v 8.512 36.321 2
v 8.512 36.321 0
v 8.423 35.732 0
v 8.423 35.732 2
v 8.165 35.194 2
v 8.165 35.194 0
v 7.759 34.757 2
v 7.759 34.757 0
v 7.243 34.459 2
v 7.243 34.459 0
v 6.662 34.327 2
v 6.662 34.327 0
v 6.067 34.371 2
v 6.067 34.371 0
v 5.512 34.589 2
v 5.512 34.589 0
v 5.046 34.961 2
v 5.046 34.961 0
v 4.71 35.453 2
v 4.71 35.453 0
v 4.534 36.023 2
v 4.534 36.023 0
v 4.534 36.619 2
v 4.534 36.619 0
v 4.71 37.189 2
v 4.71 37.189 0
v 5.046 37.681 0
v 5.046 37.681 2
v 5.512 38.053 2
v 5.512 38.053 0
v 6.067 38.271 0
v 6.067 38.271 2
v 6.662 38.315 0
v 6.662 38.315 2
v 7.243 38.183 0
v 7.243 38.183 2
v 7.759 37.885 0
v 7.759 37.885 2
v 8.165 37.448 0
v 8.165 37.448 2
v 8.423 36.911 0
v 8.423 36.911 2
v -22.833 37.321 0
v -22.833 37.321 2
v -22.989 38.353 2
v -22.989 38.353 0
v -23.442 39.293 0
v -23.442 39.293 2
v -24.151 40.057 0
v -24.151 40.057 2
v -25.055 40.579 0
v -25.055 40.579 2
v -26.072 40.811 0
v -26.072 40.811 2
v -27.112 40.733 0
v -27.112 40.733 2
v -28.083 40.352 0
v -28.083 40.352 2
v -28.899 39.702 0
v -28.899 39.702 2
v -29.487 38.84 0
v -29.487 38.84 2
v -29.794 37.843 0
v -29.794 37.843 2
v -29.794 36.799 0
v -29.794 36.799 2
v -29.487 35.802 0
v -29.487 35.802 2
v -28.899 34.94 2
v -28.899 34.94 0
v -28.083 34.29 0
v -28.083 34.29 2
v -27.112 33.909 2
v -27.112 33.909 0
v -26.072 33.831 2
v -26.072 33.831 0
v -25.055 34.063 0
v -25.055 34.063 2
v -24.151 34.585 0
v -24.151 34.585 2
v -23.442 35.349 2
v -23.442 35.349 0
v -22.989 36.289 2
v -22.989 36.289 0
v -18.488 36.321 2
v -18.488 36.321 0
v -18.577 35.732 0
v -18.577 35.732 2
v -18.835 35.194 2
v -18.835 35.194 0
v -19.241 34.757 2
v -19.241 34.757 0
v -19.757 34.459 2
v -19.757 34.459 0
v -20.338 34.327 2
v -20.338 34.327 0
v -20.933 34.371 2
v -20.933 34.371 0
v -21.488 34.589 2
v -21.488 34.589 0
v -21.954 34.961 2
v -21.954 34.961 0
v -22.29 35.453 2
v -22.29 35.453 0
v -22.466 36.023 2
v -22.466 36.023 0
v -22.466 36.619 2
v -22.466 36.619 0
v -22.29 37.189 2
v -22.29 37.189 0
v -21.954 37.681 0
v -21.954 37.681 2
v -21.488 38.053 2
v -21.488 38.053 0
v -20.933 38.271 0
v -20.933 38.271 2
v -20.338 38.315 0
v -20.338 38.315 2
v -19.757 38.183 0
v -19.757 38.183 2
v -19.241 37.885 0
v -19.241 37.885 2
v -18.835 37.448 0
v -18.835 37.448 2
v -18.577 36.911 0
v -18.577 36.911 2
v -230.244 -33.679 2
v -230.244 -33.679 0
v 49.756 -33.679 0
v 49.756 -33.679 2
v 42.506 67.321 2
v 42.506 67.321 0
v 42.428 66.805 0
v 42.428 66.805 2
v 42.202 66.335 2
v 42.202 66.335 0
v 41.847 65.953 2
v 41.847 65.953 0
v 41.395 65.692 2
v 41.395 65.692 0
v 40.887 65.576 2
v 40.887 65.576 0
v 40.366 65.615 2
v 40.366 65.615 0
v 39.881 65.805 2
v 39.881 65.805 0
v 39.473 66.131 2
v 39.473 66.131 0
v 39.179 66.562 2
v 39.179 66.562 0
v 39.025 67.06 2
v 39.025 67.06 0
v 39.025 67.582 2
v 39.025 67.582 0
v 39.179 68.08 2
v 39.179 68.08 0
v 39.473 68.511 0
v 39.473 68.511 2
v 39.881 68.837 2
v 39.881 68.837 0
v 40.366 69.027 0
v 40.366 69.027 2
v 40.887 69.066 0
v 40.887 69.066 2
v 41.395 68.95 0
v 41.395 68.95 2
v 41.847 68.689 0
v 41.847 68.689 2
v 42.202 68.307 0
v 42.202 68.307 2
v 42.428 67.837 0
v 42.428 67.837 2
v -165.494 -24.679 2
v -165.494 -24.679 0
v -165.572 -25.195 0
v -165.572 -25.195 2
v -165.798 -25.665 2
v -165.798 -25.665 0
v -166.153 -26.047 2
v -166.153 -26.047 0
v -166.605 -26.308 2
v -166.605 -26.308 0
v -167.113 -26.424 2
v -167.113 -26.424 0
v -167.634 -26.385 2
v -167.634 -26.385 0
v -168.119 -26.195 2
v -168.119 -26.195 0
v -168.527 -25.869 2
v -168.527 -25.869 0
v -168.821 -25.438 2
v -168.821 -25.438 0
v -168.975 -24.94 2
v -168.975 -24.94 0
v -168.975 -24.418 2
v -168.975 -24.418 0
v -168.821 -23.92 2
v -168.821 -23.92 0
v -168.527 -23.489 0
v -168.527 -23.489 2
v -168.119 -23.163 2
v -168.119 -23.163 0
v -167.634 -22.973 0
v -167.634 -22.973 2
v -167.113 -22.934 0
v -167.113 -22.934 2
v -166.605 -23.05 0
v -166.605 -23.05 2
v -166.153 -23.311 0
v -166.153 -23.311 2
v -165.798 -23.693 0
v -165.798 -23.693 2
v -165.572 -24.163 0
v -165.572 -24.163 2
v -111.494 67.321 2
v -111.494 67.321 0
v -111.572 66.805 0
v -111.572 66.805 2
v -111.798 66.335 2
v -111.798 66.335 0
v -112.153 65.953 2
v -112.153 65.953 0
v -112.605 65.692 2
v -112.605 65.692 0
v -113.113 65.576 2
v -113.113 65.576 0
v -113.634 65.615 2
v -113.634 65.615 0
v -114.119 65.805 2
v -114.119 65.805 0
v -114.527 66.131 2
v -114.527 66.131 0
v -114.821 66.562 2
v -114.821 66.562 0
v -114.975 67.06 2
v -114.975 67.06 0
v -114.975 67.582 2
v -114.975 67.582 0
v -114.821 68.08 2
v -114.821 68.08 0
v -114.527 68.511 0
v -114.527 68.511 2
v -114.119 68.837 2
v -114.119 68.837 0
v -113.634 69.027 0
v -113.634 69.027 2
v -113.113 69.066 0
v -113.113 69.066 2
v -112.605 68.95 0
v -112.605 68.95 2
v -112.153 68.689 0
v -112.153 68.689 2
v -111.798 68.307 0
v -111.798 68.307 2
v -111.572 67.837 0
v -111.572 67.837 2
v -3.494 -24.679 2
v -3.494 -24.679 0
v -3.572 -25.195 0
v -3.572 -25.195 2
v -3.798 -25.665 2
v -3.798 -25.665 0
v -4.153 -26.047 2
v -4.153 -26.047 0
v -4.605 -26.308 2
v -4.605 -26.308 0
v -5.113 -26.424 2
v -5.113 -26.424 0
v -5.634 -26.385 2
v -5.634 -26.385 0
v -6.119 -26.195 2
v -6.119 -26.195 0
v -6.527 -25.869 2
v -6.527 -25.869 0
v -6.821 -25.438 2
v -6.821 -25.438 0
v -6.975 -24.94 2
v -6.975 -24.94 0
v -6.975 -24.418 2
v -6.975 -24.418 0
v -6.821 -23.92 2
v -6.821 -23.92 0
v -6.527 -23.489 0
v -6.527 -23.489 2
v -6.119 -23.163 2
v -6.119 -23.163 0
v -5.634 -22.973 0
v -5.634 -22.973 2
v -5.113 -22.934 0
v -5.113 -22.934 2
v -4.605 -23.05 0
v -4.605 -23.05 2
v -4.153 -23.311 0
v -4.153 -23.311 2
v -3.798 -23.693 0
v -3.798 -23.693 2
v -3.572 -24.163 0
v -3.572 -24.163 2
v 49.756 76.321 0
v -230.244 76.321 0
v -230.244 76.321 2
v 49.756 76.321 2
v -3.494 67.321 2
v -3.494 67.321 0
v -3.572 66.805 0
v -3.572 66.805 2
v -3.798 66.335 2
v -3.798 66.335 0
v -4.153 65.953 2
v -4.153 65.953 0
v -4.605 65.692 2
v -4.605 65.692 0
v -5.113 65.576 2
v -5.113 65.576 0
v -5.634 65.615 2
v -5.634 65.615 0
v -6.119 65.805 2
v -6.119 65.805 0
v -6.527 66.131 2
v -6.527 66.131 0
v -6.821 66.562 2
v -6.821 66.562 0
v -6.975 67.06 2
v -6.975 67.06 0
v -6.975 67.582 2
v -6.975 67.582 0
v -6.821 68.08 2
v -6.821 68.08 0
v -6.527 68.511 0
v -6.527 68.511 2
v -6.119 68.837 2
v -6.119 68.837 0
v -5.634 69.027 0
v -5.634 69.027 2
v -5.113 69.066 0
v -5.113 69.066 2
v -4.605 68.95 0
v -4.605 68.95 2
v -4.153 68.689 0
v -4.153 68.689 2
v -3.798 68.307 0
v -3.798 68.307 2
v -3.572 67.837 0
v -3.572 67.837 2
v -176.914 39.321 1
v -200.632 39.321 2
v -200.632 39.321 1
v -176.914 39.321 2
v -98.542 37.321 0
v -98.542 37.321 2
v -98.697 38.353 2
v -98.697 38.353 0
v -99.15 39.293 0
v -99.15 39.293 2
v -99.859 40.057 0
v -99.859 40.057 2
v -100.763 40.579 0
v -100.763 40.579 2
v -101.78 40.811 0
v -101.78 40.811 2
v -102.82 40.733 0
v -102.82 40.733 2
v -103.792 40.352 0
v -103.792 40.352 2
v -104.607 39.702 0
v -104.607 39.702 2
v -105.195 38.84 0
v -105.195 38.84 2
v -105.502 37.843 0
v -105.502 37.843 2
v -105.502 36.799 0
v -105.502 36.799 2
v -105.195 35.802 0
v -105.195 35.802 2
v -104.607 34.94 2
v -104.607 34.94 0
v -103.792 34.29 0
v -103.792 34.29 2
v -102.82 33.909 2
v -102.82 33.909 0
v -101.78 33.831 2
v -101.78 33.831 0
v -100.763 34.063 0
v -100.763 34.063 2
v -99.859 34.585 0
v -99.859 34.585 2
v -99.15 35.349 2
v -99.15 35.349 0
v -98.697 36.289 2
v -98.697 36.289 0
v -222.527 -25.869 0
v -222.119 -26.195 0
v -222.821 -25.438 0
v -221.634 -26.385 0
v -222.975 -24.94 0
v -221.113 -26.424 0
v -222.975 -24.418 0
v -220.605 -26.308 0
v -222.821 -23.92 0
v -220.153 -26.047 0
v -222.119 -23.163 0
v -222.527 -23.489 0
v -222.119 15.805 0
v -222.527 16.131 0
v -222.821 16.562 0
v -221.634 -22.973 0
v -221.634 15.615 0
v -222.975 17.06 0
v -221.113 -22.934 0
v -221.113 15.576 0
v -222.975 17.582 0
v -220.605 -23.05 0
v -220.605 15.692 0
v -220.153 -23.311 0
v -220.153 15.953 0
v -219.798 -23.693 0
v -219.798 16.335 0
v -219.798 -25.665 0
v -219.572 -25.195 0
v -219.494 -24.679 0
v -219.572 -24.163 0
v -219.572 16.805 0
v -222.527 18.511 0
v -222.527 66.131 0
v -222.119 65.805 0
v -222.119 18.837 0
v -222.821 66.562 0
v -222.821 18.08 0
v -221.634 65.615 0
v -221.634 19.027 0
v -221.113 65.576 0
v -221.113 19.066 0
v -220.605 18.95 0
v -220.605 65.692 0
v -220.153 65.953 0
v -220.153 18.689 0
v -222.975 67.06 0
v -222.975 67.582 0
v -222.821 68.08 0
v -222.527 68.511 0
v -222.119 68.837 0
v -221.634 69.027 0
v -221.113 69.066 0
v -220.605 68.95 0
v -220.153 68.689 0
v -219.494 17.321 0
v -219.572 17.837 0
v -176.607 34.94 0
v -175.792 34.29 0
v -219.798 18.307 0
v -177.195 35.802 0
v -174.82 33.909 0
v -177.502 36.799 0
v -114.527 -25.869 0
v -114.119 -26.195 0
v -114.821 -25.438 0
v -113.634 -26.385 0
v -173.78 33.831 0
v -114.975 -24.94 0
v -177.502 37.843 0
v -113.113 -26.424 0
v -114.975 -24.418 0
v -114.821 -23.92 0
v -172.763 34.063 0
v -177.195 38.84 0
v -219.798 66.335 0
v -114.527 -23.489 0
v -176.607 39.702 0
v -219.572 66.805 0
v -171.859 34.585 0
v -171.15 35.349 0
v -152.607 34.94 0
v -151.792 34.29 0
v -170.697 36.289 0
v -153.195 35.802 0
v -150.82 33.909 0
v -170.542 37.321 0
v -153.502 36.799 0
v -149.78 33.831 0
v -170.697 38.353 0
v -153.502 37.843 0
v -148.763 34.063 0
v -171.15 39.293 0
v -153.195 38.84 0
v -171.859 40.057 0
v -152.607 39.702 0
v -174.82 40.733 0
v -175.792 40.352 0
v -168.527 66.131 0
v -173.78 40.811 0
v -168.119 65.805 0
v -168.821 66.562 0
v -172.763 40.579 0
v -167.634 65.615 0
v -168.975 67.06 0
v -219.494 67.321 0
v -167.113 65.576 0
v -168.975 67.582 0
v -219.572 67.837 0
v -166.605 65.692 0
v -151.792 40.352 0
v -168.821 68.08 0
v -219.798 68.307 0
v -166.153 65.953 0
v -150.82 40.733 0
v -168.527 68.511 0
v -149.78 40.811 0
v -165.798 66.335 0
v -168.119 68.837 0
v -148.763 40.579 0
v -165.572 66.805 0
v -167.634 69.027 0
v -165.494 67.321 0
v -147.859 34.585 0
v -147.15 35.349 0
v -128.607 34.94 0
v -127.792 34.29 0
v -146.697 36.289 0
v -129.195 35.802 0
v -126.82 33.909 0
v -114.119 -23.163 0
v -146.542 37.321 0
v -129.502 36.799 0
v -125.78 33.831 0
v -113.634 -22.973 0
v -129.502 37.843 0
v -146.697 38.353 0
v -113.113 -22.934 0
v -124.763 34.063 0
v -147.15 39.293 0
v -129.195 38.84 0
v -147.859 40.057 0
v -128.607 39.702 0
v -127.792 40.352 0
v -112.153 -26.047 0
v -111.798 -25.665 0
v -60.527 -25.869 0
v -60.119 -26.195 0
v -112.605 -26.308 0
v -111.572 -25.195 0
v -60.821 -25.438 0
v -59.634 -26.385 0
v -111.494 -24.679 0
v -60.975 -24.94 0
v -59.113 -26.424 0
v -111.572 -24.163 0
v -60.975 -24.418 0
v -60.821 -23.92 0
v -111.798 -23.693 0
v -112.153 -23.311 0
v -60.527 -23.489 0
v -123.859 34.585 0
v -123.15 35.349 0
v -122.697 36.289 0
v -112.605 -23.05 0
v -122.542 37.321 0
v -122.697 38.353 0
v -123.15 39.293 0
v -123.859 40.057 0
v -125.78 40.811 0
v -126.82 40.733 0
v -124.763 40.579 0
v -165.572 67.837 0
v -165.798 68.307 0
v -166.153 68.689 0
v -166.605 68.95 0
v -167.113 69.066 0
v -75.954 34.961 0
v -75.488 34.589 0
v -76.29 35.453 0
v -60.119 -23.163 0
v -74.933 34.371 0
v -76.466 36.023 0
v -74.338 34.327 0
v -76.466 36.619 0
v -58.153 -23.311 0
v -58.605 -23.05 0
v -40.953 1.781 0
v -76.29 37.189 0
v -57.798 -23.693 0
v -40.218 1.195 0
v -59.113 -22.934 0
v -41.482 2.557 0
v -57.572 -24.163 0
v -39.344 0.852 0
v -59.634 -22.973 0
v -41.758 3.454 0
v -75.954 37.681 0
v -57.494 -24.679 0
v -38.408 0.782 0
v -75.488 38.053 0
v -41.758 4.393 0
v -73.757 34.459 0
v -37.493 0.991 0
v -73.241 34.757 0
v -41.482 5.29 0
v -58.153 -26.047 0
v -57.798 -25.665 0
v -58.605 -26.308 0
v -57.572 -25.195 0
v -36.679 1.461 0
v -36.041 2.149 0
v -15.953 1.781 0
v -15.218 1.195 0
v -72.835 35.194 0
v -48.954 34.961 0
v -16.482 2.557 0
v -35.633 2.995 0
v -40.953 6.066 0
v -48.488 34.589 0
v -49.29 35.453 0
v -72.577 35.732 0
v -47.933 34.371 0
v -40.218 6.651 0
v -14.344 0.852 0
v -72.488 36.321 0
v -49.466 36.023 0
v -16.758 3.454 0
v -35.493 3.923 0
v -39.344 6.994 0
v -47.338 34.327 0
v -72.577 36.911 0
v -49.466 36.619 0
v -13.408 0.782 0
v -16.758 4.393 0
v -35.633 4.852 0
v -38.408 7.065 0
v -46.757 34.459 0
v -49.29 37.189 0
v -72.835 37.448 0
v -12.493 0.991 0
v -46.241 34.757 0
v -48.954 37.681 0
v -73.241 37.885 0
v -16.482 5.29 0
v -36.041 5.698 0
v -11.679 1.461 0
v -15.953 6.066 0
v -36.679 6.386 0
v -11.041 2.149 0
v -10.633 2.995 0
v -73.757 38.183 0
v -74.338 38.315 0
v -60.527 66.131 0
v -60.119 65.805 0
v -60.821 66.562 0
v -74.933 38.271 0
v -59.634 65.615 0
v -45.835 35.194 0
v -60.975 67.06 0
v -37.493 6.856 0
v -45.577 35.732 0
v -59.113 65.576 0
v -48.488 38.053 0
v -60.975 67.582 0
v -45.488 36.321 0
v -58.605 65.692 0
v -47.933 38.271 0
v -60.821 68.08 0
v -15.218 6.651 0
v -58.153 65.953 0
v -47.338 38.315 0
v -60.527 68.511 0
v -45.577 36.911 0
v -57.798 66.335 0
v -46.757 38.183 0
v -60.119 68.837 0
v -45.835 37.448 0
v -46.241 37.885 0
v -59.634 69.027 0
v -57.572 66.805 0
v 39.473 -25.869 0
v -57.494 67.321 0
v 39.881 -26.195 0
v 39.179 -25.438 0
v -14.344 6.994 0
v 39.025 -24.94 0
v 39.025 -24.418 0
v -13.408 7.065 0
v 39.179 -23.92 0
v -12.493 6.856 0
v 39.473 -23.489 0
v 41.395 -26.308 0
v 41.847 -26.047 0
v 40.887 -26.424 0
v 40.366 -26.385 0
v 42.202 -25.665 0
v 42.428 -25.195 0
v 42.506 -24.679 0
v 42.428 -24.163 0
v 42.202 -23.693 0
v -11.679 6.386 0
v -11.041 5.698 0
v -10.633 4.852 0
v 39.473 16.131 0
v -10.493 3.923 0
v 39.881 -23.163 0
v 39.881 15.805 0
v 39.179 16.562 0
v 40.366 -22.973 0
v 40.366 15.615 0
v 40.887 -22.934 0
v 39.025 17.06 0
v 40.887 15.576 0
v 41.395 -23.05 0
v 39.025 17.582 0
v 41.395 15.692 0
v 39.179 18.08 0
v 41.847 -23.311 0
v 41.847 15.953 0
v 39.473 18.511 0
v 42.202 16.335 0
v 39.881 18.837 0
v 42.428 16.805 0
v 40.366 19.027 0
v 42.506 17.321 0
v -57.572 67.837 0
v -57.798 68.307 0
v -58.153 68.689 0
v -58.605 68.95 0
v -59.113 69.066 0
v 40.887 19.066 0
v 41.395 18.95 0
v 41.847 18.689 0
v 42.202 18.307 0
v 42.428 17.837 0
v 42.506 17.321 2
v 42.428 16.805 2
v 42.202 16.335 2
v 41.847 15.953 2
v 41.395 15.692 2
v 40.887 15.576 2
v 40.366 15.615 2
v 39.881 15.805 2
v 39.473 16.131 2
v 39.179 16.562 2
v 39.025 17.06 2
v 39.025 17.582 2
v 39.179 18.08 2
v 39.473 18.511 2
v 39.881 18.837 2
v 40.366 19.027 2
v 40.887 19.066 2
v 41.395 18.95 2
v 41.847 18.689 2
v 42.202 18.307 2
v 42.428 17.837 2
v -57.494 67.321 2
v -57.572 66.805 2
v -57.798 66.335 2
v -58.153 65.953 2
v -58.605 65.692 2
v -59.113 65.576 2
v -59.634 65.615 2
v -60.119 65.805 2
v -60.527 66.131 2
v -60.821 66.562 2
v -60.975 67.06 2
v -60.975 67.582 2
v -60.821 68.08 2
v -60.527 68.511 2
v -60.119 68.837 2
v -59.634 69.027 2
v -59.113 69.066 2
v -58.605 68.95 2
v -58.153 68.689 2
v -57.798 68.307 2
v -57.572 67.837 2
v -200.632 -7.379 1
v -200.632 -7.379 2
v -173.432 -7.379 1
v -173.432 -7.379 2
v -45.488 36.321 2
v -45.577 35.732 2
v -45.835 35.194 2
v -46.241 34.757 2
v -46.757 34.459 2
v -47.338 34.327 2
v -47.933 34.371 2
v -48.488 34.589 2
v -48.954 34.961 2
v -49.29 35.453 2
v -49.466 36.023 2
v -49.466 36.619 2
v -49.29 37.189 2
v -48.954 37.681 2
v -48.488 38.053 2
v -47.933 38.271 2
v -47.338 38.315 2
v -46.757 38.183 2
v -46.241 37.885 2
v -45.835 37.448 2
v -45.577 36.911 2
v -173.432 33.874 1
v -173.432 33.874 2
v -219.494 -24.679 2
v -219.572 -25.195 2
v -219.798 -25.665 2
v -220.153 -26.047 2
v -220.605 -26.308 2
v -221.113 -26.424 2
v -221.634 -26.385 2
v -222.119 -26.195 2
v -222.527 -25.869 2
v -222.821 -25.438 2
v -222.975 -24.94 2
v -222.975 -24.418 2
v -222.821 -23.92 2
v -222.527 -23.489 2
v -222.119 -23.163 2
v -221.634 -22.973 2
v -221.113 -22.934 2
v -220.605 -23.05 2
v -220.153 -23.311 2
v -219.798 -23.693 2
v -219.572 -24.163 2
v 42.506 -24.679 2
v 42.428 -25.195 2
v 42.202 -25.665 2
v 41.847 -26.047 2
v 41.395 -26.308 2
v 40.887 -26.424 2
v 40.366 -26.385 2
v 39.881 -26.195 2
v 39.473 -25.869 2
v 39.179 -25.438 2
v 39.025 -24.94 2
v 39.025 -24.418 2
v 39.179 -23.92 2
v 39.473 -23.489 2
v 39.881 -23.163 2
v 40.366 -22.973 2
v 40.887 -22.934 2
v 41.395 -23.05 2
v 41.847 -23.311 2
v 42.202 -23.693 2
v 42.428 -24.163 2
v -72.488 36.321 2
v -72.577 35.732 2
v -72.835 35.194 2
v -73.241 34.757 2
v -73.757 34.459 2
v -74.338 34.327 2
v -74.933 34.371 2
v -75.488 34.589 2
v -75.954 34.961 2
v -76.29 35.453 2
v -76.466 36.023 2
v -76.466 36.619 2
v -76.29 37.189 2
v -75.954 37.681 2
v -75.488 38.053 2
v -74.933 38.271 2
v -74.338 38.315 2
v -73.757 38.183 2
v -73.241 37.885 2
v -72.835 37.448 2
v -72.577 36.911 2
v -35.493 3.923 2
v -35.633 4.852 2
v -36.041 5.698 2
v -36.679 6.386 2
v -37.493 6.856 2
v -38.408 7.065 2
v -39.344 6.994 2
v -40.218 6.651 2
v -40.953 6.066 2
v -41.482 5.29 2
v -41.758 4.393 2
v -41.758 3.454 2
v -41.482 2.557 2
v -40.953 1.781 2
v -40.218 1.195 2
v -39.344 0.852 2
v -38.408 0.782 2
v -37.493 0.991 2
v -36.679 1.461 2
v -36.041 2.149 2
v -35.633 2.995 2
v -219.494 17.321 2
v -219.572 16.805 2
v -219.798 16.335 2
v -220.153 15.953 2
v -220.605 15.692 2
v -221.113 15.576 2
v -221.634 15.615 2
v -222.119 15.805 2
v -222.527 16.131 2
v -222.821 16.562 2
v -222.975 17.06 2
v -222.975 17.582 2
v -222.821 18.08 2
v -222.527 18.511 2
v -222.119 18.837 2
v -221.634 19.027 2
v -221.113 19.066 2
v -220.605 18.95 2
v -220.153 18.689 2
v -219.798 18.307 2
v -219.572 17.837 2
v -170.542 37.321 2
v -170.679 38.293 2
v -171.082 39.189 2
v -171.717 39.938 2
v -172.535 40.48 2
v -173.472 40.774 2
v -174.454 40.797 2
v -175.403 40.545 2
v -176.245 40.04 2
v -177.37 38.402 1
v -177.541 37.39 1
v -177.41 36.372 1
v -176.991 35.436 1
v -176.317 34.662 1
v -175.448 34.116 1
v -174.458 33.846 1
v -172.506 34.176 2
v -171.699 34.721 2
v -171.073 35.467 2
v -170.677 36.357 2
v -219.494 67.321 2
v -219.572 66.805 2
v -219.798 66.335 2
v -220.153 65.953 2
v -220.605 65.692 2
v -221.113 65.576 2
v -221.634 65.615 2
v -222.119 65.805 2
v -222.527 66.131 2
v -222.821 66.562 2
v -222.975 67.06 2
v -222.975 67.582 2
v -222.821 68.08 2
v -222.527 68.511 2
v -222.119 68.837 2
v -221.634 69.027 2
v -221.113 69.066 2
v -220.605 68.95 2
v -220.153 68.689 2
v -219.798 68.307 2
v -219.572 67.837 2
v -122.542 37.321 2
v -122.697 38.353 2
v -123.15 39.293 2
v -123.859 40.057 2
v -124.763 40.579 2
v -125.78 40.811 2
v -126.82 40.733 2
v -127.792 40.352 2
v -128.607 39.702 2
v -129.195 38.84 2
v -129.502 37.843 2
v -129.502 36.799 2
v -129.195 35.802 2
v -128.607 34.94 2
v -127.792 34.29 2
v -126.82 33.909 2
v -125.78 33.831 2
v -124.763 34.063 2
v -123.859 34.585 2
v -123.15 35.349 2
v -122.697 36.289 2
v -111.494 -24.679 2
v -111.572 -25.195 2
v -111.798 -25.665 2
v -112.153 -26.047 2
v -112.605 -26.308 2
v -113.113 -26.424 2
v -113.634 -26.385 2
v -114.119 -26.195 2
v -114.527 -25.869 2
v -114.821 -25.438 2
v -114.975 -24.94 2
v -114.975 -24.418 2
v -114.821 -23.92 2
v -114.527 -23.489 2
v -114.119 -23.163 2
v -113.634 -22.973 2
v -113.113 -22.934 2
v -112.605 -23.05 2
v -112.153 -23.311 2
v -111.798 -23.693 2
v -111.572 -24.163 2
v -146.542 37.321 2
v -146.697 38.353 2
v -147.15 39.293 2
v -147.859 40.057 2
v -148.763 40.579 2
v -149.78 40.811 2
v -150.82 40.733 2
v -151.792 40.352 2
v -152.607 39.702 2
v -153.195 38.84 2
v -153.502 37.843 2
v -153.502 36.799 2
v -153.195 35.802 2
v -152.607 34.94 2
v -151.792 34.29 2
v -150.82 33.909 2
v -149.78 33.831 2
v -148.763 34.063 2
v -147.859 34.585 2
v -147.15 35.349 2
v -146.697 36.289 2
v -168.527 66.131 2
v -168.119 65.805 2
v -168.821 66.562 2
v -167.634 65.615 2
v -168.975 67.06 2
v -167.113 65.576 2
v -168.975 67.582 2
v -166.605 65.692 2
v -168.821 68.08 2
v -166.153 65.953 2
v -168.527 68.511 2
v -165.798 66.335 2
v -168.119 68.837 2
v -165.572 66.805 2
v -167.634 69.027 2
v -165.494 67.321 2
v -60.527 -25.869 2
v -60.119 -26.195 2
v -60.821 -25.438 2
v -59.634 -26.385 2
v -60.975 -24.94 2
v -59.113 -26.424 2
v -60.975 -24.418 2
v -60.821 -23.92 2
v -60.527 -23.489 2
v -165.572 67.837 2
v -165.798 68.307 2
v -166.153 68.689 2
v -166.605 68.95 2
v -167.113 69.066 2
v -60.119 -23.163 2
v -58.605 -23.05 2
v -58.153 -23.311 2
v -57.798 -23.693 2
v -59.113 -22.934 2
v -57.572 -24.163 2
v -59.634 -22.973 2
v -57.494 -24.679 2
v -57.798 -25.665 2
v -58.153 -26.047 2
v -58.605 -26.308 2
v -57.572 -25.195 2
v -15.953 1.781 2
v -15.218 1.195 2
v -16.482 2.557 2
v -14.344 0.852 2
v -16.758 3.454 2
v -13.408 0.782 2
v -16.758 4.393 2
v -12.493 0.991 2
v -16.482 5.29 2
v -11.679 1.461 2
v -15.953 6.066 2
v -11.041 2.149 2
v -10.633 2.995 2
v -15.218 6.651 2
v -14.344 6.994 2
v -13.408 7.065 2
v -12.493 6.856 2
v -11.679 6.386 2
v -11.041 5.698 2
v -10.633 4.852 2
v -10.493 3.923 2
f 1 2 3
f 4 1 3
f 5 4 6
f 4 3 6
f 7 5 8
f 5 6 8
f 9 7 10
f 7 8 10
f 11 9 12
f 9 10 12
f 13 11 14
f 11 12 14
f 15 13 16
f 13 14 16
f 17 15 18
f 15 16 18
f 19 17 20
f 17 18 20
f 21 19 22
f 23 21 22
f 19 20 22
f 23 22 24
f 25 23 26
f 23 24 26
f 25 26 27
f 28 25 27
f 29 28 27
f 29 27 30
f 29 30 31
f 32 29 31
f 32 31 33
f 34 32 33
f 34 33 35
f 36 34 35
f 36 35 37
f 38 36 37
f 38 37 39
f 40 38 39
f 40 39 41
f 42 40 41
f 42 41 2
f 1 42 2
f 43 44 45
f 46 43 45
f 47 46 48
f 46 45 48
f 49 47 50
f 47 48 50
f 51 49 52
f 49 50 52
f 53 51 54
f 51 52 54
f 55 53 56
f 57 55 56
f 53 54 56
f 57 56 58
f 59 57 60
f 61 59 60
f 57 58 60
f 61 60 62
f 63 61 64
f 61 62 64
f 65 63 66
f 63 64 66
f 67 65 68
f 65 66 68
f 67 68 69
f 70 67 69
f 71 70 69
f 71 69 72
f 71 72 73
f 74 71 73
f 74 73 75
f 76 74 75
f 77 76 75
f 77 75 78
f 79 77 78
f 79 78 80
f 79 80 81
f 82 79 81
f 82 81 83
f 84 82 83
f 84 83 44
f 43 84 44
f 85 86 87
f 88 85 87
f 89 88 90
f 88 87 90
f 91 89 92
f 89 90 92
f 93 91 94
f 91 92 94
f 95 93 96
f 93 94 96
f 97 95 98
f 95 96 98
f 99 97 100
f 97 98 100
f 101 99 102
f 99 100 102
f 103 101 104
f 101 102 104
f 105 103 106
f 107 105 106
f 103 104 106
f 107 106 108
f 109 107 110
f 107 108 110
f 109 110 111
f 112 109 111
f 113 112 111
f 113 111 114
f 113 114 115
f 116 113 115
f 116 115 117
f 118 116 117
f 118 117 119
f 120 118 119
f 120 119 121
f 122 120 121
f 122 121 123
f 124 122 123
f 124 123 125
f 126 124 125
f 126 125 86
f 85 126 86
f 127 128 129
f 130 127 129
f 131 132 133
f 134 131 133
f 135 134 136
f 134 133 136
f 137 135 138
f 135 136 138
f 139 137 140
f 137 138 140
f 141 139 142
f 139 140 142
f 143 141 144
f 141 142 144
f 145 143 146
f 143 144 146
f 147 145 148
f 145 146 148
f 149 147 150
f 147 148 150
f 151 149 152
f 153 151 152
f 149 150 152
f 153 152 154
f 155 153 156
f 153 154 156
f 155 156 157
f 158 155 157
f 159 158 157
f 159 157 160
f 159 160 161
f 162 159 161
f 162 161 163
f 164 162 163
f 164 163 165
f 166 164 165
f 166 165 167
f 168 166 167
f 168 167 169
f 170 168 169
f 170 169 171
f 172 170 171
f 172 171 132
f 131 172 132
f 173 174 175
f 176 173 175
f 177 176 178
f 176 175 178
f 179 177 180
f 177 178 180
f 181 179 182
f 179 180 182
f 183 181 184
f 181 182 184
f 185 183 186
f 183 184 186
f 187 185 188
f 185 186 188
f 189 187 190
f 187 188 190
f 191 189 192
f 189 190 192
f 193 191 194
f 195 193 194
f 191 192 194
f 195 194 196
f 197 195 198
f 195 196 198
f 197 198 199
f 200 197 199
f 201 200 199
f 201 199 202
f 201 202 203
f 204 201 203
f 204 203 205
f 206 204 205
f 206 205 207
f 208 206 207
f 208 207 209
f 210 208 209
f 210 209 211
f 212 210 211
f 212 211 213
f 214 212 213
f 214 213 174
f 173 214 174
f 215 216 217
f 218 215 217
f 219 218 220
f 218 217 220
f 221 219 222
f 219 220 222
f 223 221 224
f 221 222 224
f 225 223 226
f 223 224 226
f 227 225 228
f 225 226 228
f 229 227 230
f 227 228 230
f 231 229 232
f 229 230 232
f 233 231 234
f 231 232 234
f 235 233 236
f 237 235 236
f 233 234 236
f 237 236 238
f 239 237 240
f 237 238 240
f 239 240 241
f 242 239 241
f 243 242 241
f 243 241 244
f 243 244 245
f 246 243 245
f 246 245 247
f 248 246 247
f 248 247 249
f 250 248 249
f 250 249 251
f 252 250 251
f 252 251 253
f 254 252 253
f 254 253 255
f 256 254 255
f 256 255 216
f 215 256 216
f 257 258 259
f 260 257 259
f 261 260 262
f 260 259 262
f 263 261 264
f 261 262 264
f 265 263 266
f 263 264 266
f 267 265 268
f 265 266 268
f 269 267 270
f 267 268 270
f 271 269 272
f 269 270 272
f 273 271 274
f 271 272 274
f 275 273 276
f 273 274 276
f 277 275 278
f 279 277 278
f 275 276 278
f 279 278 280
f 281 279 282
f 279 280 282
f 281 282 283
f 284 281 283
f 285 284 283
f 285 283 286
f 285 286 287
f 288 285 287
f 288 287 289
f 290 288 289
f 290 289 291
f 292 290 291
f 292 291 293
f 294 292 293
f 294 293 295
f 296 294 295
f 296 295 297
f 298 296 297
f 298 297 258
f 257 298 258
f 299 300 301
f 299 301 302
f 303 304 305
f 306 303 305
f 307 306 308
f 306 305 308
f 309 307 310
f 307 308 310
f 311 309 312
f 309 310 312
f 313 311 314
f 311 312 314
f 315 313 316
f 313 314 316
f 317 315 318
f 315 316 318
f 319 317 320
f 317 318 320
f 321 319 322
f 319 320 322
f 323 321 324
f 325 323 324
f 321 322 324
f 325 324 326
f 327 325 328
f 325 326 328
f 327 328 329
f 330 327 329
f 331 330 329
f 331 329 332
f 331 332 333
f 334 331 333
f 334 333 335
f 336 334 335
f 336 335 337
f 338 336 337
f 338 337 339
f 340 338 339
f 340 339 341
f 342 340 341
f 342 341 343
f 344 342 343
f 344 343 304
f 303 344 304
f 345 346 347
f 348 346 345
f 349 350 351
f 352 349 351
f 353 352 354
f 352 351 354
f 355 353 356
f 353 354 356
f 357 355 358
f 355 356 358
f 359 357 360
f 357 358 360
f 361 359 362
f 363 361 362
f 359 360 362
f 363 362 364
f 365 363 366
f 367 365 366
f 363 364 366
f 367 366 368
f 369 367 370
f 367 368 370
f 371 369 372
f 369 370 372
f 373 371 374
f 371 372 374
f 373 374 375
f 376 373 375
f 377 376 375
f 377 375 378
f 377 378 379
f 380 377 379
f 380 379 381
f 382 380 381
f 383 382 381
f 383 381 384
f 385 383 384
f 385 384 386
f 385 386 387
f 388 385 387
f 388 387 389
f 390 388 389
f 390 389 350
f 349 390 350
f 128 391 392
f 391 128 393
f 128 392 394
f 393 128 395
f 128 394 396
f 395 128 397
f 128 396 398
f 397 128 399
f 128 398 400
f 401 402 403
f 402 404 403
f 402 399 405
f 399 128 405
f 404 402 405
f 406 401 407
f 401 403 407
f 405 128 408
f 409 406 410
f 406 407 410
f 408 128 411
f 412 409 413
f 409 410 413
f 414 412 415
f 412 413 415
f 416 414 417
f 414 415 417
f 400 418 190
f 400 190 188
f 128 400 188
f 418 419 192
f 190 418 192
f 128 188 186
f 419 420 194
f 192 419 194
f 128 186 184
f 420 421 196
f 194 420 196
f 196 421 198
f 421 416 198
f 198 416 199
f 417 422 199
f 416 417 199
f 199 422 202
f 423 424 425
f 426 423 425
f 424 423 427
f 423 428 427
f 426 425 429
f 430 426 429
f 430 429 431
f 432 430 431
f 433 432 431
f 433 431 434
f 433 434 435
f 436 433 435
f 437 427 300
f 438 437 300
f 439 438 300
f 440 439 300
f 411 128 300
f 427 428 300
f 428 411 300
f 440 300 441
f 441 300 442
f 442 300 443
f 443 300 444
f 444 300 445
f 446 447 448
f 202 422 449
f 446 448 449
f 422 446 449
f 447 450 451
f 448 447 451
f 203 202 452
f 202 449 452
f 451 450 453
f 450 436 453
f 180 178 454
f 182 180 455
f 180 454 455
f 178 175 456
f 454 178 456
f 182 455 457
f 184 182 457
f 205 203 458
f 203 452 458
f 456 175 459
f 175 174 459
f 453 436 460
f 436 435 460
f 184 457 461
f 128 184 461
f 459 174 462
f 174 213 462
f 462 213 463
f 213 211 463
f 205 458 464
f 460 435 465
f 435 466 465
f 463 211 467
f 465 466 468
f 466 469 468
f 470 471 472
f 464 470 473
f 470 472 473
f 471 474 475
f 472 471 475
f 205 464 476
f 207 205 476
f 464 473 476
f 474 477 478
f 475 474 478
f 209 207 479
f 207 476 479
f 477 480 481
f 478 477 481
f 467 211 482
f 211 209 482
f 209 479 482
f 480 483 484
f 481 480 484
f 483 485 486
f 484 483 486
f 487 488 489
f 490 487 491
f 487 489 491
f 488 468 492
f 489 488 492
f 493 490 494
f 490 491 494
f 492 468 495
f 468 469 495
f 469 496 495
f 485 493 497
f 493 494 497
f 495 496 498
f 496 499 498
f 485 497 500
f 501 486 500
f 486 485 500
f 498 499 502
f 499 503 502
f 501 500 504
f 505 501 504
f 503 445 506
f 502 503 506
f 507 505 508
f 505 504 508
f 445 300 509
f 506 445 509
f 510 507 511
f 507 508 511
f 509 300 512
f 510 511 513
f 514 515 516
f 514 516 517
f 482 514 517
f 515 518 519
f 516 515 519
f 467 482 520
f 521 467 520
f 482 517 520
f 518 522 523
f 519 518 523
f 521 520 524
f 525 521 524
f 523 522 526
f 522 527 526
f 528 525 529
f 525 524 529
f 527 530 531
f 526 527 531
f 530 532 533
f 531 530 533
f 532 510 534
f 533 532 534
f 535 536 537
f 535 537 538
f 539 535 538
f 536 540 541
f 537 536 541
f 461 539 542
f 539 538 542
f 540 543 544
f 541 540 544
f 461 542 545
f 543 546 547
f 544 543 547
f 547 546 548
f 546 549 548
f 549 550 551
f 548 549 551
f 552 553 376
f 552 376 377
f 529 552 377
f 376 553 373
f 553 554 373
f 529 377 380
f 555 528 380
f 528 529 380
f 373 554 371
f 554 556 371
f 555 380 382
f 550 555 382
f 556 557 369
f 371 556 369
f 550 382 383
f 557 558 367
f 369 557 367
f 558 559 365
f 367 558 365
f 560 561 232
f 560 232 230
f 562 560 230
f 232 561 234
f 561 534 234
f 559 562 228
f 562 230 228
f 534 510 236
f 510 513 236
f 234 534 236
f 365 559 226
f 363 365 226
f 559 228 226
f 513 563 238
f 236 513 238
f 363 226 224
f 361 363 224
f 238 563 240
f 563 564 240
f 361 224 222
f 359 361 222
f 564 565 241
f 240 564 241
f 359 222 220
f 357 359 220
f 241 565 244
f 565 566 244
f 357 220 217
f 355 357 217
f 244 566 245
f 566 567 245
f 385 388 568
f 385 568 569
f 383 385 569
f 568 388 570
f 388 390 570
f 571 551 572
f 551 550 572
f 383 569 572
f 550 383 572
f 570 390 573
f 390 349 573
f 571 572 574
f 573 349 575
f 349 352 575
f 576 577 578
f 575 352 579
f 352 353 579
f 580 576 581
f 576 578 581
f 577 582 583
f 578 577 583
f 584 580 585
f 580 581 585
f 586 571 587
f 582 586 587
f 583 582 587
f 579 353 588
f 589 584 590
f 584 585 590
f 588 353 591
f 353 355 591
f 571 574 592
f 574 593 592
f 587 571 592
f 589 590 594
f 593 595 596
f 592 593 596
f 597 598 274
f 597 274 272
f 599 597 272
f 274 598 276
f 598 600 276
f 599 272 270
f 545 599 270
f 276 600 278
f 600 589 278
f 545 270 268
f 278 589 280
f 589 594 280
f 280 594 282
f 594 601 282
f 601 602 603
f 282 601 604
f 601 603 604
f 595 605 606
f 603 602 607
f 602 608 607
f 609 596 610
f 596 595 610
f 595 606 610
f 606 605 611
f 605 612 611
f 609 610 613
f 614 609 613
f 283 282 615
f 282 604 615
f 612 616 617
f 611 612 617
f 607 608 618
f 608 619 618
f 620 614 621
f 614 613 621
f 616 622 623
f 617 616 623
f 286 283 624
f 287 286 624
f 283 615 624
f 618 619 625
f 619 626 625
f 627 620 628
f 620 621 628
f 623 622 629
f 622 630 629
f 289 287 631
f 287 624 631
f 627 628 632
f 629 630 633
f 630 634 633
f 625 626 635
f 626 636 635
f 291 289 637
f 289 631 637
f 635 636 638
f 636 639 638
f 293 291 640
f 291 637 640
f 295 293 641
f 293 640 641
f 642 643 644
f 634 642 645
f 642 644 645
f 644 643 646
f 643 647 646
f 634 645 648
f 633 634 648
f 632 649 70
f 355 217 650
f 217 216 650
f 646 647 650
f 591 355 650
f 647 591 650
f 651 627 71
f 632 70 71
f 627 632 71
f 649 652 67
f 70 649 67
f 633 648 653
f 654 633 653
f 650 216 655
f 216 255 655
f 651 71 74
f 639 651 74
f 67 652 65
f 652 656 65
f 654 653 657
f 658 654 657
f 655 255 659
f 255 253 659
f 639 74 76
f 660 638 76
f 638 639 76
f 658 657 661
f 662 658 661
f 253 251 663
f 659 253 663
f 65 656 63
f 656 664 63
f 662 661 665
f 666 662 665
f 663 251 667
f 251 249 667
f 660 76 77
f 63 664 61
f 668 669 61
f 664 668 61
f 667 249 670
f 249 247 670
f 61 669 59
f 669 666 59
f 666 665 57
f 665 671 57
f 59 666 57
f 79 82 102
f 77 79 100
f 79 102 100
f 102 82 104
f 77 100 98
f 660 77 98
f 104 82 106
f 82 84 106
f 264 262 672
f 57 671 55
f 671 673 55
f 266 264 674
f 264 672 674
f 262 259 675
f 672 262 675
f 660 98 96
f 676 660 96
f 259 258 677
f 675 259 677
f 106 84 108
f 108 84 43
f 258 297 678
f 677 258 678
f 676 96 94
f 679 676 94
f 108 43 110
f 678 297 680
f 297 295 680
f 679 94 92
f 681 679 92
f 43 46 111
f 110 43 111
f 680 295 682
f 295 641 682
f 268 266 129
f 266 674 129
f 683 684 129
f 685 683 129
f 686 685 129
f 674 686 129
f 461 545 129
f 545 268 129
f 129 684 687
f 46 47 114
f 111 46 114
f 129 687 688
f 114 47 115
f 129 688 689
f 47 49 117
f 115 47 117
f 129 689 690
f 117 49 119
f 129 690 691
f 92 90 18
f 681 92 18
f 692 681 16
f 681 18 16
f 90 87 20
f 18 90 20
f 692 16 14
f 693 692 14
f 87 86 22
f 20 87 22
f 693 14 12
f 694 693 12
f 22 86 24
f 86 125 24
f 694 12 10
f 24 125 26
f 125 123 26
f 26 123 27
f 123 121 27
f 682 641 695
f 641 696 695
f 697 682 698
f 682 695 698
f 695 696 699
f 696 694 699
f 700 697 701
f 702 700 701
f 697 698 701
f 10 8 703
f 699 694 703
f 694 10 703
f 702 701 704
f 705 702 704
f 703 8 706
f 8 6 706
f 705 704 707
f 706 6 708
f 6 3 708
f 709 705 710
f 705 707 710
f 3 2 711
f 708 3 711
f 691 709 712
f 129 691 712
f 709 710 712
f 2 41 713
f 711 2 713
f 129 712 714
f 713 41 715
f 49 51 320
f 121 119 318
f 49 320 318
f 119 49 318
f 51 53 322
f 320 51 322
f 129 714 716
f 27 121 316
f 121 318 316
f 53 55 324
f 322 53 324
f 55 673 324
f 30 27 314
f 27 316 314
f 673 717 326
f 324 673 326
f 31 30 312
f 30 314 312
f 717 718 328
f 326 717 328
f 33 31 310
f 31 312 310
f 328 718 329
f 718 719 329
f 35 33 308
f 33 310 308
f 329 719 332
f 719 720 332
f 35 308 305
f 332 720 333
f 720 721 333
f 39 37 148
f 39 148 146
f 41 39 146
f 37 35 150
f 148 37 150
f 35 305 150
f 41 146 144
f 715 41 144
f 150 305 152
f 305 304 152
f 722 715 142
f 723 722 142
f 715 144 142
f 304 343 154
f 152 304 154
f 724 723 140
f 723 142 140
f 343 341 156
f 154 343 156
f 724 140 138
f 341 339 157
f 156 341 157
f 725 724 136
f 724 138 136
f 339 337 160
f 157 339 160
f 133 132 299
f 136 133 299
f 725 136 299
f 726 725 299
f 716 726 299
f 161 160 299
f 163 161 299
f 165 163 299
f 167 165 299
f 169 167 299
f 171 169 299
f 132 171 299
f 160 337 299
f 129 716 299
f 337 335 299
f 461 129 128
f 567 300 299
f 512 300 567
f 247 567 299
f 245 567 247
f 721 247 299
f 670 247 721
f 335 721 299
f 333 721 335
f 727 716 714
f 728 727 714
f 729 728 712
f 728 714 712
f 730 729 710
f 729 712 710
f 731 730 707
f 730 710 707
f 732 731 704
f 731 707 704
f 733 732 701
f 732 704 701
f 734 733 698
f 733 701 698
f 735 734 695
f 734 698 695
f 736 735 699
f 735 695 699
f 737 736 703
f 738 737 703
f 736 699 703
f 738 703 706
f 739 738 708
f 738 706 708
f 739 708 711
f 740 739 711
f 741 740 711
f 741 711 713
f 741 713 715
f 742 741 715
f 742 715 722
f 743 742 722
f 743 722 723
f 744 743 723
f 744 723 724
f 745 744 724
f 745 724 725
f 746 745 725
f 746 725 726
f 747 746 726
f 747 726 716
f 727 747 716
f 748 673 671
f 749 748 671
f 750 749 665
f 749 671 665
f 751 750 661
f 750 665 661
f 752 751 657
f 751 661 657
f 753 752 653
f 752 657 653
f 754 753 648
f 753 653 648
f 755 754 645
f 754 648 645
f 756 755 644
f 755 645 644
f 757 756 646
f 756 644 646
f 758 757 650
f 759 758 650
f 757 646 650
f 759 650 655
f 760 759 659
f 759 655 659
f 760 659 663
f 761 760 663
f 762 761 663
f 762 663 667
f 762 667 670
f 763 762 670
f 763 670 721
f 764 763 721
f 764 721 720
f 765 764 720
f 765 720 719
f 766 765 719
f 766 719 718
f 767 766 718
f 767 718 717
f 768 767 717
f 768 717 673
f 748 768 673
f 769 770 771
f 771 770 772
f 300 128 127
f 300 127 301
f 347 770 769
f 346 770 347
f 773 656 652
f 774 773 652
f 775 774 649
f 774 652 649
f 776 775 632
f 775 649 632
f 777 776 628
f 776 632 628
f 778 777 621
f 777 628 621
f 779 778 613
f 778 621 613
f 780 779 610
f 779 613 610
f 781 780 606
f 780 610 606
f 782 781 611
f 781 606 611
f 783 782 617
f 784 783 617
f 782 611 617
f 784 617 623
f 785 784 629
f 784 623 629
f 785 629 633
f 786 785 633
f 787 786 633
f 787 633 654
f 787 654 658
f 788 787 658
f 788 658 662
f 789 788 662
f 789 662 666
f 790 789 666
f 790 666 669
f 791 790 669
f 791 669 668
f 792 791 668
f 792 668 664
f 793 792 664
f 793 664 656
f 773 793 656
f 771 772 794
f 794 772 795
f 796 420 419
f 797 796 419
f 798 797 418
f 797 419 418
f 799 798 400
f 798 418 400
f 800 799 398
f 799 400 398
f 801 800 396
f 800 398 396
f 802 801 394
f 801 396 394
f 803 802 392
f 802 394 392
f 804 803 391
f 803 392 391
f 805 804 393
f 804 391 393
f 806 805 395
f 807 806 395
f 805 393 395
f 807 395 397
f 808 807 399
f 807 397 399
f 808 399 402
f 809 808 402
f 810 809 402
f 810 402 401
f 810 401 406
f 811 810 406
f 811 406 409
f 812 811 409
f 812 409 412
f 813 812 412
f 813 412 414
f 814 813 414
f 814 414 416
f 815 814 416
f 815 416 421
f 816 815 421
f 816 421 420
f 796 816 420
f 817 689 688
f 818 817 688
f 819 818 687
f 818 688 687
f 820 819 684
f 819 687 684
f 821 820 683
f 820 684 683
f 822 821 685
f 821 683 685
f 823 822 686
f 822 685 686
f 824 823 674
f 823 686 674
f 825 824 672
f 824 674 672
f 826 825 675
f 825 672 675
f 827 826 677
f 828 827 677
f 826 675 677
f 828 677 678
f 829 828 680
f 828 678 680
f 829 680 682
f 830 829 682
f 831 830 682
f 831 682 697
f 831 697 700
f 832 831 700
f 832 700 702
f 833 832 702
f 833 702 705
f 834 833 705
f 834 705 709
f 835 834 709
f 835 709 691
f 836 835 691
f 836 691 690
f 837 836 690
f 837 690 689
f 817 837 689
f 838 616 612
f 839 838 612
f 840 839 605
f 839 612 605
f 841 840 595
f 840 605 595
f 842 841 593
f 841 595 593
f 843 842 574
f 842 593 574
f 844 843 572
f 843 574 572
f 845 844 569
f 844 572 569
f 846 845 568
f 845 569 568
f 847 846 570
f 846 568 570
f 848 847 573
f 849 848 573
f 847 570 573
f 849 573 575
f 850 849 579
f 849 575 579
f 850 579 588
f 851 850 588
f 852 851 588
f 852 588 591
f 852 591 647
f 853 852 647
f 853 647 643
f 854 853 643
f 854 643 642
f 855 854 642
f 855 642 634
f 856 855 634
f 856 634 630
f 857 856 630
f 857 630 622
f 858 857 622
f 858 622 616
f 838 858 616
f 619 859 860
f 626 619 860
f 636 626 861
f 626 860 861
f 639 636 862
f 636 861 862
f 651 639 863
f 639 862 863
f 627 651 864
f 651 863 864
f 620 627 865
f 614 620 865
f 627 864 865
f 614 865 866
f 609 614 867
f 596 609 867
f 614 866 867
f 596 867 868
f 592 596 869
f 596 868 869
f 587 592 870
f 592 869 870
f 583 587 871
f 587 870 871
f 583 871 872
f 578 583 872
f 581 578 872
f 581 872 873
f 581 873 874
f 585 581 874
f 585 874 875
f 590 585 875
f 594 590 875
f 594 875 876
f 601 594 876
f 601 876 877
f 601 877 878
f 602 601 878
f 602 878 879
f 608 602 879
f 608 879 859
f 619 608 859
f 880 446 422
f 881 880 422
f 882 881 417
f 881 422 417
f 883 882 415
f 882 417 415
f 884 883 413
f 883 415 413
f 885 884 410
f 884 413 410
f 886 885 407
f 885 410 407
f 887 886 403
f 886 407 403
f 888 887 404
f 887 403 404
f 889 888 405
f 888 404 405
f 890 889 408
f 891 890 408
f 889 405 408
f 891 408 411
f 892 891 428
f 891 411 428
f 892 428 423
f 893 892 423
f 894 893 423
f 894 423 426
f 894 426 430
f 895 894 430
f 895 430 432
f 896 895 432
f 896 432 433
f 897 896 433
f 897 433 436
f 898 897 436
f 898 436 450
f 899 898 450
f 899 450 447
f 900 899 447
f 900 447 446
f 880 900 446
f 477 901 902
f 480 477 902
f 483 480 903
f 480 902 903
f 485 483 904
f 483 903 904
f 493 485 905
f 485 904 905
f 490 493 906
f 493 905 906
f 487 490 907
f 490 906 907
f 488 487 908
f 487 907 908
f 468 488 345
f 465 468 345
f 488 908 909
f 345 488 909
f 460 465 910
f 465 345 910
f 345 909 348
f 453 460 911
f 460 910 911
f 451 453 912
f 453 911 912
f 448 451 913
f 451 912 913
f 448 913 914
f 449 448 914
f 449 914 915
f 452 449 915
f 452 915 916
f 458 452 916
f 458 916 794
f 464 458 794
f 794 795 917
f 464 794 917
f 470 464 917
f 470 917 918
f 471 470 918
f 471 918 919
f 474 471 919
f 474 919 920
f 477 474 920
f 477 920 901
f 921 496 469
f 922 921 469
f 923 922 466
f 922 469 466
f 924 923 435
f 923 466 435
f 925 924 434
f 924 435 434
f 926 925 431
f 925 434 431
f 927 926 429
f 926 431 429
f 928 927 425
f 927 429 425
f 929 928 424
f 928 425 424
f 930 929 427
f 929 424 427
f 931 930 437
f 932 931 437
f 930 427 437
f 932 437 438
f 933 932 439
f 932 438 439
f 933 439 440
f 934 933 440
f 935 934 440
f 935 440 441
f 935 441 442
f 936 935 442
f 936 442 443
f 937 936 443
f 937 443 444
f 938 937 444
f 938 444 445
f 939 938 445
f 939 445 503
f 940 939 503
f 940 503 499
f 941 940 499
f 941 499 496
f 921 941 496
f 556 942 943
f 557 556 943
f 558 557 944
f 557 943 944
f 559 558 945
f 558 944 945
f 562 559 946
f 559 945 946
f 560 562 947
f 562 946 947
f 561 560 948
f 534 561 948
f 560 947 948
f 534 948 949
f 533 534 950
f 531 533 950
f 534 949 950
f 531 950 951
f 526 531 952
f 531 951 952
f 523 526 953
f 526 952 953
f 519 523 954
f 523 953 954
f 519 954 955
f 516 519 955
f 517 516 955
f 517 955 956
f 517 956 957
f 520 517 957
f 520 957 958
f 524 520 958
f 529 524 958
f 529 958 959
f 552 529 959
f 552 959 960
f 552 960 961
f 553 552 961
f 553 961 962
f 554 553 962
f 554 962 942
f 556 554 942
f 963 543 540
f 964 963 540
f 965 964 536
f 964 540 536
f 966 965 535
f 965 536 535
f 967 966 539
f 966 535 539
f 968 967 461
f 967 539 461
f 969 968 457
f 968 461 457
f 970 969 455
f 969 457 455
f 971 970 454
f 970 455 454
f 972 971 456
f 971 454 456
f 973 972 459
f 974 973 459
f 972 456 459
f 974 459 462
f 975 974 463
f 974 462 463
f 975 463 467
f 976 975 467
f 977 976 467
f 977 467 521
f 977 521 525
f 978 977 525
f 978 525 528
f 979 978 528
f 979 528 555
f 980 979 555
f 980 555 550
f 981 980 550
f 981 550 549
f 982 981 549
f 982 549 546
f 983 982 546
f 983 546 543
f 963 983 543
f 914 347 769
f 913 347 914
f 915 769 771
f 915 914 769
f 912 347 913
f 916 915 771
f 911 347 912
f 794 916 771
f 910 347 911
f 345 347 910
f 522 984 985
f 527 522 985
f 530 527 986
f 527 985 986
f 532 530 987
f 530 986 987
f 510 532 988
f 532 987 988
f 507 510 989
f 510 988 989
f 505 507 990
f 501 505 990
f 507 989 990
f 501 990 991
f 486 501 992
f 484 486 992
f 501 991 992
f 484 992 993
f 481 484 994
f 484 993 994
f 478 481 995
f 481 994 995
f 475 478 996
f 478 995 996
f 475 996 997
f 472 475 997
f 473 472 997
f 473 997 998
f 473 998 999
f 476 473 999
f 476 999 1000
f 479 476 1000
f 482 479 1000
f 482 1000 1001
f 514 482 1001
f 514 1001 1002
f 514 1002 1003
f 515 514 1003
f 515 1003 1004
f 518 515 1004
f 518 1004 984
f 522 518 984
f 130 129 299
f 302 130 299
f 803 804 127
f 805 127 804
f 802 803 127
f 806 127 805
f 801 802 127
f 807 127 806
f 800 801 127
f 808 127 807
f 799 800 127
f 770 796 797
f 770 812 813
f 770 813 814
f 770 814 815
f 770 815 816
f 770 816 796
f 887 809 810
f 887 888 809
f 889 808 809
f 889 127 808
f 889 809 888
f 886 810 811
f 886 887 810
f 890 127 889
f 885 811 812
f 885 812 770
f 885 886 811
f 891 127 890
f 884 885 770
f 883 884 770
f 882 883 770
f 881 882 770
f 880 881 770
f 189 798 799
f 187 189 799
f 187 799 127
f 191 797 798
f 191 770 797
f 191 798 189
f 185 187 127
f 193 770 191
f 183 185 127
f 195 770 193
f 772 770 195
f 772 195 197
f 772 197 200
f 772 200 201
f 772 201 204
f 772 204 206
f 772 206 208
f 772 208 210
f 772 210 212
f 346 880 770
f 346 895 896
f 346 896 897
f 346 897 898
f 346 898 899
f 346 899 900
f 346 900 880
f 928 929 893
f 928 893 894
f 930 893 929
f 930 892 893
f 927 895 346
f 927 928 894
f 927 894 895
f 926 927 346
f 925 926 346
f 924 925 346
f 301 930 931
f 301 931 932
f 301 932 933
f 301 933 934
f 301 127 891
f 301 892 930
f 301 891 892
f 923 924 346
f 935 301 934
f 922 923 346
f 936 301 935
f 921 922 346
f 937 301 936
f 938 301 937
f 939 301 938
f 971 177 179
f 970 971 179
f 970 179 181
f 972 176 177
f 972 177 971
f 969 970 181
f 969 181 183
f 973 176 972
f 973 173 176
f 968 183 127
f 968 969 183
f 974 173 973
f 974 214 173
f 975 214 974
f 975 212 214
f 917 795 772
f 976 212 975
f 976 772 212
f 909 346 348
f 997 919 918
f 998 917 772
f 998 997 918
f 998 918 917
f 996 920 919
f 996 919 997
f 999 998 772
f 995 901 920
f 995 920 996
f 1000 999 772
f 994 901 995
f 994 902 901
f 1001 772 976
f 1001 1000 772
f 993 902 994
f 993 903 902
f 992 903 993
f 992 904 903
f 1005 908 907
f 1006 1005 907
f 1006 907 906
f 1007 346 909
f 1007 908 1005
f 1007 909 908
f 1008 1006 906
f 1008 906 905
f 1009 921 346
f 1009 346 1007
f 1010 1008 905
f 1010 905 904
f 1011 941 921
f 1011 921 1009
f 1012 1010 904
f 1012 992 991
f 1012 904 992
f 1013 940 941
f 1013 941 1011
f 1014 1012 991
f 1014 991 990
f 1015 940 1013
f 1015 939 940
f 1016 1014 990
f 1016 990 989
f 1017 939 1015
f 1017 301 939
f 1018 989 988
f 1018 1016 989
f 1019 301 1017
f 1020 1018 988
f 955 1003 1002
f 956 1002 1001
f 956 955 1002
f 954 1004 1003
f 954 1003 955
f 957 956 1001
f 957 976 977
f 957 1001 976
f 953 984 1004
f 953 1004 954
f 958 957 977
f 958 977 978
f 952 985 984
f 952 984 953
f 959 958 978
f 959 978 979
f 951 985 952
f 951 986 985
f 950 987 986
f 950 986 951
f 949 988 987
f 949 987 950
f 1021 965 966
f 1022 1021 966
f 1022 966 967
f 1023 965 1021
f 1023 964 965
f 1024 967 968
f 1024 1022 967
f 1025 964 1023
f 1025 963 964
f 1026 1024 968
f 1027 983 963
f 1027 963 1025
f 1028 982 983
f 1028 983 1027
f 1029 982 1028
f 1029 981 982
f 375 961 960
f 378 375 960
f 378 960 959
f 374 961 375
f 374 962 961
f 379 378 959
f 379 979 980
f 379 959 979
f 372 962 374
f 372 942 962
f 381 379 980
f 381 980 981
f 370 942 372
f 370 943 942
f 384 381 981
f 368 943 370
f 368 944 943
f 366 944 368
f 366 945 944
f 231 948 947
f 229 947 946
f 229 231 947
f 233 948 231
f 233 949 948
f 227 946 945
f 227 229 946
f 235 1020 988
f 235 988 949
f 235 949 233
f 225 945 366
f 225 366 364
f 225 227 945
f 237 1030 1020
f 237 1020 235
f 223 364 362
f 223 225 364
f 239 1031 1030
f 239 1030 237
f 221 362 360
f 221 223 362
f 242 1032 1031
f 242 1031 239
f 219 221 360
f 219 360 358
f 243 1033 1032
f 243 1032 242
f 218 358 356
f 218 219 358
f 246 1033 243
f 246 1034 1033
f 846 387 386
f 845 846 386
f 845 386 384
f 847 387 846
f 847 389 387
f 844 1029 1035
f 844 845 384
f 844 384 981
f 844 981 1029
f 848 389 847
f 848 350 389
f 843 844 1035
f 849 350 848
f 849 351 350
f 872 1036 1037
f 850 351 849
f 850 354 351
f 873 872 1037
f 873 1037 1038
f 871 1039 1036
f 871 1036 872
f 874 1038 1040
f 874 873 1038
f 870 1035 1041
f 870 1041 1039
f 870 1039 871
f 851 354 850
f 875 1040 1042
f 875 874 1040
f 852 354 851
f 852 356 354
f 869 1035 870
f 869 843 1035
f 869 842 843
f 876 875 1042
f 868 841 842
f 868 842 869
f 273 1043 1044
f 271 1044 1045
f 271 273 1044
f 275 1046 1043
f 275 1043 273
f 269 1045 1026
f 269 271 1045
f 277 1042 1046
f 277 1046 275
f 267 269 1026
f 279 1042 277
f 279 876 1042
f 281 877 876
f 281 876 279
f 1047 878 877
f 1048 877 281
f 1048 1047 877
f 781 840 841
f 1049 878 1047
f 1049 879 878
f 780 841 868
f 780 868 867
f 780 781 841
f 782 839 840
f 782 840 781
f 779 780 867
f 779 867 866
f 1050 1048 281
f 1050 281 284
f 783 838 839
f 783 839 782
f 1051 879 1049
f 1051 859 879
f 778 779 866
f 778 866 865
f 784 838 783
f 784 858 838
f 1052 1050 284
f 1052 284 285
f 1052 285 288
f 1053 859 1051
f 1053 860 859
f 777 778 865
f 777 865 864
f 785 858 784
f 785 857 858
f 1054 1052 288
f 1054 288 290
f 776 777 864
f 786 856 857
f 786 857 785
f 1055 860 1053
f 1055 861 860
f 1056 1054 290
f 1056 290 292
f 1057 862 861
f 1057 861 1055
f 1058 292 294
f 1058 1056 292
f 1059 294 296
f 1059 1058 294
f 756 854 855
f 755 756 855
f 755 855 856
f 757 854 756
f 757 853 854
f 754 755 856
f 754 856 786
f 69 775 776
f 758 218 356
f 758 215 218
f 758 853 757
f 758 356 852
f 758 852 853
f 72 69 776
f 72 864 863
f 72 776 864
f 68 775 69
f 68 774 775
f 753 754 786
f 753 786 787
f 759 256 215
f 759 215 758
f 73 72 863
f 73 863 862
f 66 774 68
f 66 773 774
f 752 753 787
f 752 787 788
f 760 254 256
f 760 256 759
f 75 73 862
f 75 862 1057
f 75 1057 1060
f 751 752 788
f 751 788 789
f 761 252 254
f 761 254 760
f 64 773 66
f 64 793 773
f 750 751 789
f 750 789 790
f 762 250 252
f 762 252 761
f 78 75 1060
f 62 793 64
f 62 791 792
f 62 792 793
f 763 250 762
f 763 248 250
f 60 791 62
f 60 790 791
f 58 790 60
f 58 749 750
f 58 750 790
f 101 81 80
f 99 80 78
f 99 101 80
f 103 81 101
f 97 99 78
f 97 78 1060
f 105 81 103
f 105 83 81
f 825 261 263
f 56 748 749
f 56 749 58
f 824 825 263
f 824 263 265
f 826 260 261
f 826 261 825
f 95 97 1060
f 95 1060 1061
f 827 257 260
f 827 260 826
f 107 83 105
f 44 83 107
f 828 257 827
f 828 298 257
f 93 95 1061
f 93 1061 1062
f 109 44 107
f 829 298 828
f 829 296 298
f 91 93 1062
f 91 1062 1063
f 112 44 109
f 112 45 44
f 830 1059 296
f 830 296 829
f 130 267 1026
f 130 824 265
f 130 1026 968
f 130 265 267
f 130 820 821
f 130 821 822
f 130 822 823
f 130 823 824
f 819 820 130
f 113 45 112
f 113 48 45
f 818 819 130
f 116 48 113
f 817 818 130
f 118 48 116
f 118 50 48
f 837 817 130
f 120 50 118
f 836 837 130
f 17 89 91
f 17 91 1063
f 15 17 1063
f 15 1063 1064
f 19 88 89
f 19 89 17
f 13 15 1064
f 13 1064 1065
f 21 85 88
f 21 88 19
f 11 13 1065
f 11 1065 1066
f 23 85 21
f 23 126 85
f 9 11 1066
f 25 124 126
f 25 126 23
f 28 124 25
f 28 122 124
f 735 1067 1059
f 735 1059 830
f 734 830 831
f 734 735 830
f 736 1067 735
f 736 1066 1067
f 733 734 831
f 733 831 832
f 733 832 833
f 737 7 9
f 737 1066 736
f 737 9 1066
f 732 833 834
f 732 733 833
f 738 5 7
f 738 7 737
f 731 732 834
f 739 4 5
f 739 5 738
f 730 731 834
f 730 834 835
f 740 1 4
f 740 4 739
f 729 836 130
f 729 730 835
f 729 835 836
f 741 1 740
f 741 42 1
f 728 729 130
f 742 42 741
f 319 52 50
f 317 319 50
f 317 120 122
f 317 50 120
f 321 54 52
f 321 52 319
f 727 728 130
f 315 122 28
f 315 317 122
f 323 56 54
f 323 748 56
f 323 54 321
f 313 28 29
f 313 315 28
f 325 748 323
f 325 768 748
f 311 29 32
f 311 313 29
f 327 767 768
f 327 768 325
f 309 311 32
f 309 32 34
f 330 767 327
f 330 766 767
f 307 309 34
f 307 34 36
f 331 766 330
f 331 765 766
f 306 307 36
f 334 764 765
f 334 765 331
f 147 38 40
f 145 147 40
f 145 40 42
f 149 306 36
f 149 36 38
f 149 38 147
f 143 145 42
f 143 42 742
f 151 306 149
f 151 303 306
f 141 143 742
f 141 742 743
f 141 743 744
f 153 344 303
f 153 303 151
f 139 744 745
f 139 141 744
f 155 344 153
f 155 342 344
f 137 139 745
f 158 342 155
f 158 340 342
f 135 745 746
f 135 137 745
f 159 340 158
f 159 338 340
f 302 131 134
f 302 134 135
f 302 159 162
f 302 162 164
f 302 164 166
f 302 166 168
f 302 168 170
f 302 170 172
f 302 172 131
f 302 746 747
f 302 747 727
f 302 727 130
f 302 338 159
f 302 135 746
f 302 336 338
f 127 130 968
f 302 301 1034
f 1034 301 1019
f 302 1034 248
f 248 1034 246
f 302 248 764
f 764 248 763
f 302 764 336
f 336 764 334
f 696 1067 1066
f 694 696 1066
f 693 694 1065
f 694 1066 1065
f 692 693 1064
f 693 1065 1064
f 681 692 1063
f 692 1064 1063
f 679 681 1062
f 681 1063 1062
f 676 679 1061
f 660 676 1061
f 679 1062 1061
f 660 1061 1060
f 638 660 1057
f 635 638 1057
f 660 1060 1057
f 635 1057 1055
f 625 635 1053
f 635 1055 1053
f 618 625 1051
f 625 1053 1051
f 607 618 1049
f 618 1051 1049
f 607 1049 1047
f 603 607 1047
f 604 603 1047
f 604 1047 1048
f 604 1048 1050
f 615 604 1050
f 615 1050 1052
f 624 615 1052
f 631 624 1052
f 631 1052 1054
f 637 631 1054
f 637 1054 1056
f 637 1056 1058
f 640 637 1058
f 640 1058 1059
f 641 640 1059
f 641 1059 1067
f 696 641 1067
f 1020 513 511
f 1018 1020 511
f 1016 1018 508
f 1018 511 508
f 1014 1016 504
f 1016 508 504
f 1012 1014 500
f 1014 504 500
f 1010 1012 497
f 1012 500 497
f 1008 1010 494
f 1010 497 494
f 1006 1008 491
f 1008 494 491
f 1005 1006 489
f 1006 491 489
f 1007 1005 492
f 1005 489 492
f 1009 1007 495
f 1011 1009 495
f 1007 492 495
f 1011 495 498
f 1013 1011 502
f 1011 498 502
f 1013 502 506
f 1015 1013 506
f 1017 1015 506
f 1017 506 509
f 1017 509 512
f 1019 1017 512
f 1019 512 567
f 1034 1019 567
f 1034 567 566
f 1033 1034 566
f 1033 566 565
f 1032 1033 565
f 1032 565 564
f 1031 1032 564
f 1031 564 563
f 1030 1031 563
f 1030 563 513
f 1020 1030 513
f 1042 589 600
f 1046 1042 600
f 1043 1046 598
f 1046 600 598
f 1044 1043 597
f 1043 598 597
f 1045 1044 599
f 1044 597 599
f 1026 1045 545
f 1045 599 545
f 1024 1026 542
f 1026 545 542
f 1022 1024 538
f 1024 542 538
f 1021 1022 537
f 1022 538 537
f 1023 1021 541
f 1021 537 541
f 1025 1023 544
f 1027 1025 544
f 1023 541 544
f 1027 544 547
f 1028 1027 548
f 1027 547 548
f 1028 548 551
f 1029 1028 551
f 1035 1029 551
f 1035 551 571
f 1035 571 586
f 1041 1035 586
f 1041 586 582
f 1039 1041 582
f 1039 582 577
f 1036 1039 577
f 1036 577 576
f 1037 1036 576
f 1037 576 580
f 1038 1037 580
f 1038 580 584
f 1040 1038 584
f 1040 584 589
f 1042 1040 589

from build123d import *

# Parameters (mm, degrees)
F0_W     = 280
F0_H     = 110
F1_DEPTH = 2
F2_R     = 3.5
F2_R_2   = 3.15
F3_DEPTH = 25
F4_R     = 2
F4_R_2   = 1.75
F5_DEPTH = 25
F6_W     = 27.2
F6_H     = 46.7
F7_DEPTH = 1


with BuildPart() as f1:
    # F0 (on Top) → F1 (new body)
    with BuildSketch(Plane.XY):
        with Locations((-90.244181, 21.321014)):
            Rectangle(F0_W, F0_H)
    extrude(amount=F1_DEPTH)

    # F2 (on face) → F3 (cut)
    with BuildSketch(Plane.XY.offset(2)):
        with Locations((-174.041525, 37.321014)):
            Circle(F2_R)
        with Locations((-150.041525, 37.321014)):
            Circle(F2_R)
        with Locations((-126.041525, 37.321014)):
            Circle(F2_R)
        with Locations((-102.041525, 37.321014)):
            Circle(F2_R)
        with Locations((-26.333425, 37.321014)):
            Circle(F2_R)
        with Locations((-13.643486, 3.923428)):
            Circle(F2_R_2)
        with Locations((-38.643486, 3.923428)):
            Circle(F2_R_2)
    extrude(amount=-F3_DEPTH, mode=Mode.SUBTRACT)

    # F4 (on face) → F5 (cut)
    with BuildSketch(Plane(origin=(0, 0, 0), x_dir=(1, 0, 0), z_dir=(0, 0, -1))):
        with Locations((6.512116, -36.321014)):
            Circle(F4_R)
        with Locations((-20.487884, -36.321014)):
            Circle(F4_R)
        with Locations((-47.487884, -36.321014)):
            Circle(F4_R)
        with Locations((-74.487884, -36.321014)):
            Circle(F4_R)
        with Locations((-221.244181, 24.678986)):
            Circle(F4_R_2)
        with Locations((-221.244181, -67.321014)):
            Circle(F4_R_2)
        with Locations((40.755819, 24.678986)):
            Circle(F4_R_2)
        with Locations((40.755819, -67.321014)):
            Circle(F4_R_2)
        with Locations((-167.244181, 24.678986)):
            Circle(F4_R_2)
        with Locations((-167.244181, -67.321014)):
            Circle(F4_R_2)
        with Locations((-113.244181, 24.678986)):
            Circle(F4_R_2)
        with Locations((-113.244181, -67.321014)):
            Circle(F4_R_2)
        with Locations((-59.244181, 24.678986)):
            Circle(F4_R_2)
        with Locations((-59.244181, -67.321014)):
            Circle(F4_R_2)
        with Locations((-5.244181, 24.678986)):
            Circle(F4_R_2)
        with Locations((-5.244181, -67.321014)):
            Circle(F4_R_2)
        with Locations((-221.244181, -17.321014)):
            Circle(F4_R_2)
        with Locations((40.755819, -17.321014)):
            Circle(F4_R_2)
    extrude(amount=-F5_DEPTH, mode=Mode.SUBTRACT)

    # F6 (on face) → F7 (cut)
    with BuildSketch(Plane.XY.offset(2)):
        with Locations((-187.032314, 15.971014)):
            Rectangle(F6_W, F6_H)
    extrude(amount=-F7_DEPTH, mode=Mode.SUBTRACT)


solid = f1.part
